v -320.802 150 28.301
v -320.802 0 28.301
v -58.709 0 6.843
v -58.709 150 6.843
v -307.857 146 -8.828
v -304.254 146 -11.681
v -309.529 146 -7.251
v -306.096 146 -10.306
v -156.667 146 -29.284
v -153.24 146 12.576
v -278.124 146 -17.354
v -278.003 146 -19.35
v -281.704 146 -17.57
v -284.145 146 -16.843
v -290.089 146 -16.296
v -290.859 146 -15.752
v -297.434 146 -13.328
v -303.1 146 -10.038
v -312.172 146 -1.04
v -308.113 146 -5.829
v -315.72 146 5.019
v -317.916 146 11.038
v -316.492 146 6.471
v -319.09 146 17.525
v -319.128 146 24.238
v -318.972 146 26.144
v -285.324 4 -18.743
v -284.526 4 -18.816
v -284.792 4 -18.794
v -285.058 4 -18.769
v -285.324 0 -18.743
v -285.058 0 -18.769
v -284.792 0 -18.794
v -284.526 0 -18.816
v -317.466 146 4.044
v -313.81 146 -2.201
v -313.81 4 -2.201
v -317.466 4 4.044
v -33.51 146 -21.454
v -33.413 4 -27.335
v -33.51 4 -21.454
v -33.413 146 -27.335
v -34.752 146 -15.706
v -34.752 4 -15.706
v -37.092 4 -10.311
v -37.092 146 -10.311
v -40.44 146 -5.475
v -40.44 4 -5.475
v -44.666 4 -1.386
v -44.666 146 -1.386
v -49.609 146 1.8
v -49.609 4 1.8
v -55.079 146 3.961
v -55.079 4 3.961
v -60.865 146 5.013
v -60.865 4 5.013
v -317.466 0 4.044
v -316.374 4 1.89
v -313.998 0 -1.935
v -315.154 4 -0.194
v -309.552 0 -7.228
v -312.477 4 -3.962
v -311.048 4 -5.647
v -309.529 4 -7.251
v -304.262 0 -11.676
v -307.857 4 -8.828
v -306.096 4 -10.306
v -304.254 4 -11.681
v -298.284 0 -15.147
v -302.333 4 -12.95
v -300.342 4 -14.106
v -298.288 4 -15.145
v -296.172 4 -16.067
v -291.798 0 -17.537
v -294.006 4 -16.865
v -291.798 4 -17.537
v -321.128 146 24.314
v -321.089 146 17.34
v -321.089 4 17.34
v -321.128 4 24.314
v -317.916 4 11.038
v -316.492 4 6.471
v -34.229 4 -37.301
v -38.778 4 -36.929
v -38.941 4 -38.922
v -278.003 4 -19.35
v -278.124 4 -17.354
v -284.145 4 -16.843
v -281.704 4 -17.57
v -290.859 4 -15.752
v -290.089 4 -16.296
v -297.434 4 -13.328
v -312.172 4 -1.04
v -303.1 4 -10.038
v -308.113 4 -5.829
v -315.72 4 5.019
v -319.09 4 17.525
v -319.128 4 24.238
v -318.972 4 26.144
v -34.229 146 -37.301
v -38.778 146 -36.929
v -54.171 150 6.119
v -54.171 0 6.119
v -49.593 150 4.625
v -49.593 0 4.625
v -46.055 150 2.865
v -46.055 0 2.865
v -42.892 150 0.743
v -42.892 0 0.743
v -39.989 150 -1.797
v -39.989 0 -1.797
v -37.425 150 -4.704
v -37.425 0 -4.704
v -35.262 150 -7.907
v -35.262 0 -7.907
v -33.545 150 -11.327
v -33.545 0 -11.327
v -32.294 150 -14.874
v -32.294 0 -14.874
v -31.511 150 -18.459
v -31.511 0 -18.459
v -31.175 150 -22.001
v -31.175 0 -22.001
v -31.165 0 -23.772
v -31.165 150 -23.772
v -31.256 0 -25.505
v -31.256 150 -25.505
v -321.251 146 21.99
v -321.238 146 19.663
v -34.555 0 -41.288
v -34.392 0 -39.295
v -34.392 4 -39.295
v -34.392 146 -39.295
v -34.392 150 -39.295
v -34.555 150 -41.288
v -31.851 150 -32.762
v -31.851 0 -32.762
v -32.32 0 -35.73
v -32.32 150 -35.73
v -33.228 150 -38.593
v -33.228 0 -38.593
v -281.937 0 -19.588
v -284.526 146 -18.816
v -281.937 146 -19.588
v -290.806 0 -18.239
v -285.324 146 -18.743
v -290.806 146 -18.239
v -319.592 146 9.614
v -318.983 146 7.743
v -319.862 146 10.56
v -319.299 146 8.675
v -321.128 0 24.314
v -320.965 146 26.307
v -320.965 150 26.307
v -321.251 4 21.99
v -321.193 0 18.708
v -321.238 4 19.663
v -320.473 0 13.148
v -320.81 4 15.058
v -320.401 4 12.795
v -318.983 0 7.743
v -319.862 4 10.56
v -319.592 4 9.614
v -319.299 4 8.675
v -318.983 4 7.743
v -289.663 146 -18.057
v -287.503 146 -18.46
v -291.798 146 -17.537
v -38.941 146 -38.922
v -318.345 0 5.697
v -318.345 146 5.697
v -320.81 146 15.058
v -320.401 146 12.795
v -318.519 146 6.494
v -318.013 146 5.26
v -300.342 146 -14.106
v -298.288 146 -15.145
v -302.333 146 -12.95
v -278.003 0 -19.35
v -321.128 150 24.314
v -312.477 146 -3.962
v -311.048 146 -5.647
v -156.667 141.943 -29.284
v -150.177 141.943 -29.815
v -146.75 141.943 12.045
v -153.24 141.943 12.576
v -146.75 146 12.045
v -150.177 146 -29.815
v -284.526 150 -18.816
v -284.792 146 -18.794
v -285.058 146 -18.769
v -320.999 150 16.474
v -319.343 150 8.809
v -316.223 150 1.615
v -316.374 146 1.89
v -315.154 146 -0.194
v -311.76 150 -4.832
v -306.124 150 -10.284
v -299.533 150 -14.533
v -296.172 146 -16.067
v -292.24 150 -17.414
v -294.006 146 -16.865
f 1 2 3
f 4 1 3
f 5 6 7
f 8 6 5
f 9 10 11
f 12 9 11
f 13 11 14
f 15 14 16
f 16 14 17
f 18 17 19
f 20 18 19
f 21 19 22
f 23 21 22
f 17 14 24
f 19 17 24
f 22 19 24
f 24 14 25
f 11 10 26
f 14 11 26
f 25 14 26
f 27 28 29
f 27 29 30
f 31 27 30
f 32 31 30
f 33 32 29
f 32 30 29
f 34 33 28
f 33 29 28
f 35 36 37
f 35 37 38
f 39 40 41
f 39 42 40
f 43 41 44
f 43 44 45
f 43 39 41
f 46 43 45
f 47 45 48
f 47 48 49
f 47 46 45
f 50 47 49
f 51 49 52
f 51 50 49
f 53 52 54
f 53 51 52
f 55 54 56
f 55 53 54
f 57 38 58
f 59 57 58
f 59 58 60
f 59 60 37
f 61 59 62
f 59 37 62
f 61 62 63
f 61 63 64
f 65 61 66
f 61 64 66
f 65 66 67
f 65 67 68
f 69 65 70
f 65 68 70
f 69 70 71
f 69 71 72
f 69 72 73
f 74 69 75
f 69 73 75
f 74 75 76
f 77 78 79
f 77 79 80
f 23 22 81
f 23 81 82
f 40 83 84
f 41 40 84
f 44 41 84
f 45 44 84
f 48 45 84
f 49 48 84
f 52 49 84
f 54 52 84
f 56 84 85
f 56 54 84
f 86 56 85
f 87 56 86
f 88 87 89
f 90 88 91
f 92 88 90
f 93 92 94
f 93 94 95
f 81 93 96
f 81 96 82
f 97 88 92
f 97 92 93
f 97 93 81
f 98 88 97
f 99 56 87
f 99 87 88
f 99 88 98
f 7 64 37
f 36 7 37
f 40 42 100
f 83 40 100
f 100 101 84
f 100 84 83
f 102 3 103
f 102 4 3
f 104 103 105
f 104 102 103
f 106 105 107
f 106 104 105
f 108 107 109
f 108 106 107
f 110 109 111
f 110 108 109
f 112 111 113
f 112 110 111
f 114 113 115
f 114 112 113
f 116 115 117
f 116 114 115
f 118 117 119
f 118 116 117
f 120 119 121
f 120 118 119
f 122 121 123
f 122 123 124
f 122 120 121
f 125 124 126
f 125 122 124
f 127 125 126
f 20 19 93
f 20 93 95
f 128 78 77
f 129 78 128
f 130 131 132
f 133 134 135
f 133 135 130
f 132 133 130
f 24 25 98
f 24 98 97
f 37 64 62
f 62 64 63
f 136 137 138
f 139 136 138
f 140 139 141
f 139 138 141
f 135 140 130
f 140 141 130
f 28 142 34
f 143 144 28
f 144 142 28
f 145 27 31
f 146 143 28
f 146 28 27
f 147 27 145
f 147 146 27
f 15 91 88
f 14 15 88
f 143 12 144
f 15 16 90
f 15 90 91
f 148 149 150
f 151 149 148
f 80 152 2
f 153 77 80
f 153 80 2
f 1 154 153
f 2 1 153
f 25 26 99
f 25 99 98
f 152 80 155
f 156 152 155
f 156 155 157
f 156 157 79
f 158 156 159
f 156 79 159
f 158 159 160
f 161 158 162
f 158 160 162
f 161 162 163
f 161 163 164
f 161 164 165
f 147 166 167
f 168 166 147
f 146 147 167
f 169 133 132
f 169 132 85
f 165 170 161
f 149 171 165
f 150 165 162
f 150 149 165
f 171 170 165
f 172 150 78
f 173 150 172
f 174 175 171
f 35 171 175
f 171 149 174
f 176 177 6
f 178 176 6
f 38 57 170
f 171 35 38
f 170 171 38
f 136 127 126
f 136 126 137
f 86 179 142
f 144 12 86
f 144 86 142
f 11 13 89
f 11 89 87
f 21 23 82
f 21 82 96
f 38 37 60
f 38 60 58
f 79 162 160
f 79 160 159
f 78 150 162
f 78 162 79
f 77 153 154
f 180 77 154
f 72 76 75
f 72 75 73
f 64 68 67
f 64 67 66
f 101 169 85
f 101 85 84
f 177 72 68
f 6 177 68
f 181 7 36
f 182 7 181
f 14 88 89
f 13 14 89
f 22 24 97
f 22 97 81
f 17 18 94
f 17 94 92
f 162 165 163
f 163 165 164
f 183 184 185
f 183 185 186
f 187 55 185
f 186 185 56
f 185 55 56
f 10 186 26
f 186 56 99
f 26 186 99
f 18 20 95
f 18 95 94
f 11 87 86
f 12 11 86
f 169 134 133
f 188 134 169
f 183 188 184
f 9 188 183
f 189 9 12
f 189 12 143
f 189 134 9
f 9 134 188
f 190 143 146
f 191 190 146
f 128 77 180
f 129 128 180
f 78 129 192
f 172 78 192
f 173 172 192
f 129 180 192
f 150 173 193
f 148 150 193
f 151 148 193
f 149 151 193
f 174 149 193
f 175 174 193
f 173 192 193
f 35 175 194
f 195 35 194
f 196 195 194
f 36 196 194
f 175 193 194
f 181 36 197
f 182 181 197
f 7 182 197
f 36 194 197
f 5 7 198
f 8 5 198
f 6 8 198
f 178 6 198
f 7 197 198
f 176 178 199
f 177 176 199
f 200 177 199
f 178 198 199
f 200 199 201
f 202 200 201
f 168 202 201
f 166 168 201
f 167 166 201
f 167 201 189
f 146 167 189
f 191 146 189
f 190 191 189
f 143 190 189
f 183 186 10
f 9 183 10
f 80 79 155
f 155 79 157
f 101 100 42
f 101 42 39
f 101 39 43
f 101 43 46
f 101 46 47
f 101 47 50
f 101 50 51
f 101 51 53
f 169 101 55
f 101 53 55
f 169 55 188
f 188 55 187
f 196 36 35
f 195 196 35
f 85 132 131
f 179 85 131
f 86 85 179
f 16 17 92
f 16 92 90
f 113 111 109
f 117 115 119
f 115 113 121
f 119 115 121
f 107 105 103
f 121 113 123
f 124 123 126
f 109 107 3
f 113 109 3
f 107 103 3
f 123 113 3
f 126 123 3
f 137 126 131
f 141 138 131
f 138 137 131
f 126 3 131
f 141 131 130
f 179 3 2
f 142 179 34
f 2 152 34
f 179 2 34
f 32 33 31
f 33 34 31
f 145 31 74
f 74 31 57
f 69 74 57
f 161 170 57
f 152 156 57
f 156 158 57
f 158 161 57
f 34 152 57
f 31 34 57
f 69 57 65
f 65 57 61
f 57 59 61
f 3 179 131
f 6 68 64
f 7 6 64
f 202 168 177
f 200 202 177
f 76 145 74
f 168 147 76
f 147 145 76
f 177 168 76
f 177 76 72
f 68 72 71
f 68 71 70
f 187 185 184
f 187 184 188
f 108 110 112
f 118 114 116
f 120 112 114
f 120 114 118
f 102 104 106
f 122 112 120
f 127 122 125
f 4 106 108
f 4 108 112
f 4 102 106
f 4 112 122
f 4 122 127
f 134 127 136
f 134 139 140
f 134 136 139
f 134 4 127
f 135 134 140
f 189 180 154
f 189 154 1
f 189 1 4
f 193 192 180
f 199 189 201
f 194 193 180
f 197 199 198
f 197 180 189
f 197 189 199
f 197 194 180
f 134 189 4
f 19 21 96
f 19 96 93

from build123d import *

# Parameters (mm, degrees)
EXTRUDE_THIN1_DEPTH   = 150
SKETCH5_W             = 290.970262873
SKETCH5_H             = 4
EXTRUDE_THIN2_DEPTH   = 42
EXTRUDE_THIN2_2_DEPTH = 42
FILLET6_R             = 40
EXTRUDE_THIN7_DEPTH   = 146
FILLET14_R            = 40
SKETCH25_W            = 46
SKETCH25_H            = 150
BOSS_EXTRUDE1_DEPTH   = 2
FILLET22_R            = 30
FILLET28_R            = 30
FILLET32_R            = 20
SKETCH29_W            = 6.511049677
SKETCH29_H            = 4.056851241
BOSS_EXTRUDE2_DEPTH   = 42
EXTRUDE_THIN8_DEPTH   = 142


with BuildPart() as part:
    # Sketch2 → Extrude-Thin1 (new body)
    with BuildSketch(Plane(origin=(0, 0, 0), x_dir=(1, 0, 0), z_dir=(0, 1, 0))):
        Polygon((-30.965120595, -2.565260163), (-320.965120595, -26.307498403), (-320.801927023, -28.300829248), (-30.801927023, -4.558591008), align=None)
    extrude(amount=EXTRUDE_THIN1_DEPTH)



with BuildPart() as body_2:
    # Sketch5 → Extrude-Thin2 (new body)
    with BuildSketch(Plane(origin=(0.002452129, 0, 0.029951579), x_dir=(-0.9966654225627806, 0, 0.08159678589107741), z_dir=(-0.08159678589107741, 0, -0.9966654225627806))):
        with Locations((176.556313424, 2)):
            Rectangle(SKETCH5_W, SKETCH5_H)
    extrude(amount=EXTRUDE_THIN2_DEPTH)

    # Fillet14
    fillet14_edges = [body_2.edges().sort_by_distance(p)[0] for p in [
        (-324.392185602, 2, -15.552449344),
    ]]
    fillet(fillet14_edges, radius=FILLET14_R)


with BuildPart() as body_3:
    # Sketch5 → Extrude-Thin2 2 (new body)
    with BuildSketch(Plane(origin=(0.002452129, 0, 0.029951579), x_dir=(-0.9966654225627806, 0, 0.08159678589107741), z_dir=(-0.08159678589107741, 0, -0.9966654225627806))):
        with Locations((176.556313424, 148)):
            Rectangle(SKETCH5_W, SKETCH5_H)
    extrude(amount=EXTRUDE_THIN2_2_DEPTH)

    # Fillet6
    fillet6_edges = [body_3.edges().sort_by_distance(p)[0] for p in [
        (-324.392185602, 148, -15.552449344),
    ]]
    fillet(fillet6_edges, radius=FILLET6_R)


with BuildPart() as part_1:
    add(part.part)

    add(body_3.part)  # Extrude-Thin7 merges body 3
    # Sketch11 → Extrude-Thin7 (add)
    with BuildSketch(Plane.XZ.offset(-146)):
        Polygon((-278.003111059, -19.350312998), (-281.936630301, -19.587972456), (-284.5255687, -18.81632078), (-290.805852057, -18.238730686), (-291.798277728, -17.537013607), (-298.288108084, -15.145025876), (-304.254167802, -11.68113065), (-309.528907685, -7.251025667), (-313.810104121, -2.200536359), (-317.466443209, 4.043933459), (-318.345283528, 5.696861164), (-319.86163909, 10.560086826), (-321.089242867, 17.33995769), (-321.128314167, 24.314167558), (-320.965120595, 26.307498403), (-318.97178975, 26.144304832), (-319.127856228, 24.238027995), (-319.090248803, 17.52511906), (-317.915603526, 11.037730019), (-316.491598121, 6.470687959), (-315.719800302, 5.019086377), (-312.17205348, -1.039924404), (-308.112866331, -5.828511332), (-303.100359764, -10.038373964), (-297.433799934, -13.328379507), (-290.85904721, -15.751667479), (-290.088883869, -16.296228937), (-284.144627091, -16.842915072), (-281.704255181, -17.570285439), (-278.123729185, -17.353953494), align=None)
    extrude(amount=EXTRUDE_THIN7_DEPTH)


    add(body_2.part)  # Boss-Extrude1 merges body 2
    # Sketch25 → Boss-Extrude1 (add)
    with BuildSketch(Plane(origin=(-30.967572724, 0, 2.535308584), x_dir=(-0.08159678589107766, 0, -0.9966654225627805), z_dir=(0.9966654225627803, 0, -0.08159678589107765))):
        with Locations((20.969948211, 75)):
            Rectangle(SKETCH25_W, SKETCH25_H)
    extrude(amount=BOSS_EXTRUDE1_DEPTH)

    # Fillet22
    fillet22_edges = [part_1.edges().sort_by_distance(p)[0] for p in [
        (-30.965120595, 75, 2.565260163),
    ]]
    fillet(fillet22_edges, radius=FILLET22_R)

    # Fillet28
    fillet28_edges = [part_1.edges().sort_by_distance(p)[0] for p in [
        (-28.808596178, 75, 4.395397436),
    ]]
    fillet(fillet28_edges, radius=FILLET28_R)

    # Fillet32
    # the kernel refuses this fillet: 20 mm, written as the material it takes off along each edge
    with BuildSketch(Plane(origin=(-32.562048329, -21.794494718, -41.451212002), x_dir=(0.08159678589107701, 0, 0.9966654225627805), z_dir=(0, 1, 0))) as fillet32_piece_1:
        with BuildLine():
            CenterArc((8.717797887, -20), FILLET32_R, 90, 25.841932763)
            Line((0, -2), (0, 0))
            Line((0, 0), (8.717797887, 0))
        make_face()
    extrude(amount=193.588989435, mode=Mode.SUBTRACT)

    # Sketch29 → Boss-Extrude2 (add)
    with BuildSketch(Plane(origin=(0.002452129, 0, 0.029951579), x_dir=(-0.9966654225627805, 0, 0.0815967858910774), z_dir=(-0.0815967858910774, 0, -0.9966654225627805))):
        with Locations((150.499315868, 143.971574379)):
            Rectangle(SKETCH29_W, SKETCH29_H)
    extrude(amount=BOSS_EXTRUDE2_DEPTH)

    # Sketch35 → Extrude-Thin8 (add)
    with BuildSketch(Plane.XZ.offset(-146)):
        Polygon((-34.392185602, -39.294687585), (-38.941474001, -38.922238312), (-38.77828043, -36.928907467), (-34.228992031, -37.30135674), align=None)
    extrude(amount=EXTRUDE_THIN8_DEPTH)


solid = part_1.part
